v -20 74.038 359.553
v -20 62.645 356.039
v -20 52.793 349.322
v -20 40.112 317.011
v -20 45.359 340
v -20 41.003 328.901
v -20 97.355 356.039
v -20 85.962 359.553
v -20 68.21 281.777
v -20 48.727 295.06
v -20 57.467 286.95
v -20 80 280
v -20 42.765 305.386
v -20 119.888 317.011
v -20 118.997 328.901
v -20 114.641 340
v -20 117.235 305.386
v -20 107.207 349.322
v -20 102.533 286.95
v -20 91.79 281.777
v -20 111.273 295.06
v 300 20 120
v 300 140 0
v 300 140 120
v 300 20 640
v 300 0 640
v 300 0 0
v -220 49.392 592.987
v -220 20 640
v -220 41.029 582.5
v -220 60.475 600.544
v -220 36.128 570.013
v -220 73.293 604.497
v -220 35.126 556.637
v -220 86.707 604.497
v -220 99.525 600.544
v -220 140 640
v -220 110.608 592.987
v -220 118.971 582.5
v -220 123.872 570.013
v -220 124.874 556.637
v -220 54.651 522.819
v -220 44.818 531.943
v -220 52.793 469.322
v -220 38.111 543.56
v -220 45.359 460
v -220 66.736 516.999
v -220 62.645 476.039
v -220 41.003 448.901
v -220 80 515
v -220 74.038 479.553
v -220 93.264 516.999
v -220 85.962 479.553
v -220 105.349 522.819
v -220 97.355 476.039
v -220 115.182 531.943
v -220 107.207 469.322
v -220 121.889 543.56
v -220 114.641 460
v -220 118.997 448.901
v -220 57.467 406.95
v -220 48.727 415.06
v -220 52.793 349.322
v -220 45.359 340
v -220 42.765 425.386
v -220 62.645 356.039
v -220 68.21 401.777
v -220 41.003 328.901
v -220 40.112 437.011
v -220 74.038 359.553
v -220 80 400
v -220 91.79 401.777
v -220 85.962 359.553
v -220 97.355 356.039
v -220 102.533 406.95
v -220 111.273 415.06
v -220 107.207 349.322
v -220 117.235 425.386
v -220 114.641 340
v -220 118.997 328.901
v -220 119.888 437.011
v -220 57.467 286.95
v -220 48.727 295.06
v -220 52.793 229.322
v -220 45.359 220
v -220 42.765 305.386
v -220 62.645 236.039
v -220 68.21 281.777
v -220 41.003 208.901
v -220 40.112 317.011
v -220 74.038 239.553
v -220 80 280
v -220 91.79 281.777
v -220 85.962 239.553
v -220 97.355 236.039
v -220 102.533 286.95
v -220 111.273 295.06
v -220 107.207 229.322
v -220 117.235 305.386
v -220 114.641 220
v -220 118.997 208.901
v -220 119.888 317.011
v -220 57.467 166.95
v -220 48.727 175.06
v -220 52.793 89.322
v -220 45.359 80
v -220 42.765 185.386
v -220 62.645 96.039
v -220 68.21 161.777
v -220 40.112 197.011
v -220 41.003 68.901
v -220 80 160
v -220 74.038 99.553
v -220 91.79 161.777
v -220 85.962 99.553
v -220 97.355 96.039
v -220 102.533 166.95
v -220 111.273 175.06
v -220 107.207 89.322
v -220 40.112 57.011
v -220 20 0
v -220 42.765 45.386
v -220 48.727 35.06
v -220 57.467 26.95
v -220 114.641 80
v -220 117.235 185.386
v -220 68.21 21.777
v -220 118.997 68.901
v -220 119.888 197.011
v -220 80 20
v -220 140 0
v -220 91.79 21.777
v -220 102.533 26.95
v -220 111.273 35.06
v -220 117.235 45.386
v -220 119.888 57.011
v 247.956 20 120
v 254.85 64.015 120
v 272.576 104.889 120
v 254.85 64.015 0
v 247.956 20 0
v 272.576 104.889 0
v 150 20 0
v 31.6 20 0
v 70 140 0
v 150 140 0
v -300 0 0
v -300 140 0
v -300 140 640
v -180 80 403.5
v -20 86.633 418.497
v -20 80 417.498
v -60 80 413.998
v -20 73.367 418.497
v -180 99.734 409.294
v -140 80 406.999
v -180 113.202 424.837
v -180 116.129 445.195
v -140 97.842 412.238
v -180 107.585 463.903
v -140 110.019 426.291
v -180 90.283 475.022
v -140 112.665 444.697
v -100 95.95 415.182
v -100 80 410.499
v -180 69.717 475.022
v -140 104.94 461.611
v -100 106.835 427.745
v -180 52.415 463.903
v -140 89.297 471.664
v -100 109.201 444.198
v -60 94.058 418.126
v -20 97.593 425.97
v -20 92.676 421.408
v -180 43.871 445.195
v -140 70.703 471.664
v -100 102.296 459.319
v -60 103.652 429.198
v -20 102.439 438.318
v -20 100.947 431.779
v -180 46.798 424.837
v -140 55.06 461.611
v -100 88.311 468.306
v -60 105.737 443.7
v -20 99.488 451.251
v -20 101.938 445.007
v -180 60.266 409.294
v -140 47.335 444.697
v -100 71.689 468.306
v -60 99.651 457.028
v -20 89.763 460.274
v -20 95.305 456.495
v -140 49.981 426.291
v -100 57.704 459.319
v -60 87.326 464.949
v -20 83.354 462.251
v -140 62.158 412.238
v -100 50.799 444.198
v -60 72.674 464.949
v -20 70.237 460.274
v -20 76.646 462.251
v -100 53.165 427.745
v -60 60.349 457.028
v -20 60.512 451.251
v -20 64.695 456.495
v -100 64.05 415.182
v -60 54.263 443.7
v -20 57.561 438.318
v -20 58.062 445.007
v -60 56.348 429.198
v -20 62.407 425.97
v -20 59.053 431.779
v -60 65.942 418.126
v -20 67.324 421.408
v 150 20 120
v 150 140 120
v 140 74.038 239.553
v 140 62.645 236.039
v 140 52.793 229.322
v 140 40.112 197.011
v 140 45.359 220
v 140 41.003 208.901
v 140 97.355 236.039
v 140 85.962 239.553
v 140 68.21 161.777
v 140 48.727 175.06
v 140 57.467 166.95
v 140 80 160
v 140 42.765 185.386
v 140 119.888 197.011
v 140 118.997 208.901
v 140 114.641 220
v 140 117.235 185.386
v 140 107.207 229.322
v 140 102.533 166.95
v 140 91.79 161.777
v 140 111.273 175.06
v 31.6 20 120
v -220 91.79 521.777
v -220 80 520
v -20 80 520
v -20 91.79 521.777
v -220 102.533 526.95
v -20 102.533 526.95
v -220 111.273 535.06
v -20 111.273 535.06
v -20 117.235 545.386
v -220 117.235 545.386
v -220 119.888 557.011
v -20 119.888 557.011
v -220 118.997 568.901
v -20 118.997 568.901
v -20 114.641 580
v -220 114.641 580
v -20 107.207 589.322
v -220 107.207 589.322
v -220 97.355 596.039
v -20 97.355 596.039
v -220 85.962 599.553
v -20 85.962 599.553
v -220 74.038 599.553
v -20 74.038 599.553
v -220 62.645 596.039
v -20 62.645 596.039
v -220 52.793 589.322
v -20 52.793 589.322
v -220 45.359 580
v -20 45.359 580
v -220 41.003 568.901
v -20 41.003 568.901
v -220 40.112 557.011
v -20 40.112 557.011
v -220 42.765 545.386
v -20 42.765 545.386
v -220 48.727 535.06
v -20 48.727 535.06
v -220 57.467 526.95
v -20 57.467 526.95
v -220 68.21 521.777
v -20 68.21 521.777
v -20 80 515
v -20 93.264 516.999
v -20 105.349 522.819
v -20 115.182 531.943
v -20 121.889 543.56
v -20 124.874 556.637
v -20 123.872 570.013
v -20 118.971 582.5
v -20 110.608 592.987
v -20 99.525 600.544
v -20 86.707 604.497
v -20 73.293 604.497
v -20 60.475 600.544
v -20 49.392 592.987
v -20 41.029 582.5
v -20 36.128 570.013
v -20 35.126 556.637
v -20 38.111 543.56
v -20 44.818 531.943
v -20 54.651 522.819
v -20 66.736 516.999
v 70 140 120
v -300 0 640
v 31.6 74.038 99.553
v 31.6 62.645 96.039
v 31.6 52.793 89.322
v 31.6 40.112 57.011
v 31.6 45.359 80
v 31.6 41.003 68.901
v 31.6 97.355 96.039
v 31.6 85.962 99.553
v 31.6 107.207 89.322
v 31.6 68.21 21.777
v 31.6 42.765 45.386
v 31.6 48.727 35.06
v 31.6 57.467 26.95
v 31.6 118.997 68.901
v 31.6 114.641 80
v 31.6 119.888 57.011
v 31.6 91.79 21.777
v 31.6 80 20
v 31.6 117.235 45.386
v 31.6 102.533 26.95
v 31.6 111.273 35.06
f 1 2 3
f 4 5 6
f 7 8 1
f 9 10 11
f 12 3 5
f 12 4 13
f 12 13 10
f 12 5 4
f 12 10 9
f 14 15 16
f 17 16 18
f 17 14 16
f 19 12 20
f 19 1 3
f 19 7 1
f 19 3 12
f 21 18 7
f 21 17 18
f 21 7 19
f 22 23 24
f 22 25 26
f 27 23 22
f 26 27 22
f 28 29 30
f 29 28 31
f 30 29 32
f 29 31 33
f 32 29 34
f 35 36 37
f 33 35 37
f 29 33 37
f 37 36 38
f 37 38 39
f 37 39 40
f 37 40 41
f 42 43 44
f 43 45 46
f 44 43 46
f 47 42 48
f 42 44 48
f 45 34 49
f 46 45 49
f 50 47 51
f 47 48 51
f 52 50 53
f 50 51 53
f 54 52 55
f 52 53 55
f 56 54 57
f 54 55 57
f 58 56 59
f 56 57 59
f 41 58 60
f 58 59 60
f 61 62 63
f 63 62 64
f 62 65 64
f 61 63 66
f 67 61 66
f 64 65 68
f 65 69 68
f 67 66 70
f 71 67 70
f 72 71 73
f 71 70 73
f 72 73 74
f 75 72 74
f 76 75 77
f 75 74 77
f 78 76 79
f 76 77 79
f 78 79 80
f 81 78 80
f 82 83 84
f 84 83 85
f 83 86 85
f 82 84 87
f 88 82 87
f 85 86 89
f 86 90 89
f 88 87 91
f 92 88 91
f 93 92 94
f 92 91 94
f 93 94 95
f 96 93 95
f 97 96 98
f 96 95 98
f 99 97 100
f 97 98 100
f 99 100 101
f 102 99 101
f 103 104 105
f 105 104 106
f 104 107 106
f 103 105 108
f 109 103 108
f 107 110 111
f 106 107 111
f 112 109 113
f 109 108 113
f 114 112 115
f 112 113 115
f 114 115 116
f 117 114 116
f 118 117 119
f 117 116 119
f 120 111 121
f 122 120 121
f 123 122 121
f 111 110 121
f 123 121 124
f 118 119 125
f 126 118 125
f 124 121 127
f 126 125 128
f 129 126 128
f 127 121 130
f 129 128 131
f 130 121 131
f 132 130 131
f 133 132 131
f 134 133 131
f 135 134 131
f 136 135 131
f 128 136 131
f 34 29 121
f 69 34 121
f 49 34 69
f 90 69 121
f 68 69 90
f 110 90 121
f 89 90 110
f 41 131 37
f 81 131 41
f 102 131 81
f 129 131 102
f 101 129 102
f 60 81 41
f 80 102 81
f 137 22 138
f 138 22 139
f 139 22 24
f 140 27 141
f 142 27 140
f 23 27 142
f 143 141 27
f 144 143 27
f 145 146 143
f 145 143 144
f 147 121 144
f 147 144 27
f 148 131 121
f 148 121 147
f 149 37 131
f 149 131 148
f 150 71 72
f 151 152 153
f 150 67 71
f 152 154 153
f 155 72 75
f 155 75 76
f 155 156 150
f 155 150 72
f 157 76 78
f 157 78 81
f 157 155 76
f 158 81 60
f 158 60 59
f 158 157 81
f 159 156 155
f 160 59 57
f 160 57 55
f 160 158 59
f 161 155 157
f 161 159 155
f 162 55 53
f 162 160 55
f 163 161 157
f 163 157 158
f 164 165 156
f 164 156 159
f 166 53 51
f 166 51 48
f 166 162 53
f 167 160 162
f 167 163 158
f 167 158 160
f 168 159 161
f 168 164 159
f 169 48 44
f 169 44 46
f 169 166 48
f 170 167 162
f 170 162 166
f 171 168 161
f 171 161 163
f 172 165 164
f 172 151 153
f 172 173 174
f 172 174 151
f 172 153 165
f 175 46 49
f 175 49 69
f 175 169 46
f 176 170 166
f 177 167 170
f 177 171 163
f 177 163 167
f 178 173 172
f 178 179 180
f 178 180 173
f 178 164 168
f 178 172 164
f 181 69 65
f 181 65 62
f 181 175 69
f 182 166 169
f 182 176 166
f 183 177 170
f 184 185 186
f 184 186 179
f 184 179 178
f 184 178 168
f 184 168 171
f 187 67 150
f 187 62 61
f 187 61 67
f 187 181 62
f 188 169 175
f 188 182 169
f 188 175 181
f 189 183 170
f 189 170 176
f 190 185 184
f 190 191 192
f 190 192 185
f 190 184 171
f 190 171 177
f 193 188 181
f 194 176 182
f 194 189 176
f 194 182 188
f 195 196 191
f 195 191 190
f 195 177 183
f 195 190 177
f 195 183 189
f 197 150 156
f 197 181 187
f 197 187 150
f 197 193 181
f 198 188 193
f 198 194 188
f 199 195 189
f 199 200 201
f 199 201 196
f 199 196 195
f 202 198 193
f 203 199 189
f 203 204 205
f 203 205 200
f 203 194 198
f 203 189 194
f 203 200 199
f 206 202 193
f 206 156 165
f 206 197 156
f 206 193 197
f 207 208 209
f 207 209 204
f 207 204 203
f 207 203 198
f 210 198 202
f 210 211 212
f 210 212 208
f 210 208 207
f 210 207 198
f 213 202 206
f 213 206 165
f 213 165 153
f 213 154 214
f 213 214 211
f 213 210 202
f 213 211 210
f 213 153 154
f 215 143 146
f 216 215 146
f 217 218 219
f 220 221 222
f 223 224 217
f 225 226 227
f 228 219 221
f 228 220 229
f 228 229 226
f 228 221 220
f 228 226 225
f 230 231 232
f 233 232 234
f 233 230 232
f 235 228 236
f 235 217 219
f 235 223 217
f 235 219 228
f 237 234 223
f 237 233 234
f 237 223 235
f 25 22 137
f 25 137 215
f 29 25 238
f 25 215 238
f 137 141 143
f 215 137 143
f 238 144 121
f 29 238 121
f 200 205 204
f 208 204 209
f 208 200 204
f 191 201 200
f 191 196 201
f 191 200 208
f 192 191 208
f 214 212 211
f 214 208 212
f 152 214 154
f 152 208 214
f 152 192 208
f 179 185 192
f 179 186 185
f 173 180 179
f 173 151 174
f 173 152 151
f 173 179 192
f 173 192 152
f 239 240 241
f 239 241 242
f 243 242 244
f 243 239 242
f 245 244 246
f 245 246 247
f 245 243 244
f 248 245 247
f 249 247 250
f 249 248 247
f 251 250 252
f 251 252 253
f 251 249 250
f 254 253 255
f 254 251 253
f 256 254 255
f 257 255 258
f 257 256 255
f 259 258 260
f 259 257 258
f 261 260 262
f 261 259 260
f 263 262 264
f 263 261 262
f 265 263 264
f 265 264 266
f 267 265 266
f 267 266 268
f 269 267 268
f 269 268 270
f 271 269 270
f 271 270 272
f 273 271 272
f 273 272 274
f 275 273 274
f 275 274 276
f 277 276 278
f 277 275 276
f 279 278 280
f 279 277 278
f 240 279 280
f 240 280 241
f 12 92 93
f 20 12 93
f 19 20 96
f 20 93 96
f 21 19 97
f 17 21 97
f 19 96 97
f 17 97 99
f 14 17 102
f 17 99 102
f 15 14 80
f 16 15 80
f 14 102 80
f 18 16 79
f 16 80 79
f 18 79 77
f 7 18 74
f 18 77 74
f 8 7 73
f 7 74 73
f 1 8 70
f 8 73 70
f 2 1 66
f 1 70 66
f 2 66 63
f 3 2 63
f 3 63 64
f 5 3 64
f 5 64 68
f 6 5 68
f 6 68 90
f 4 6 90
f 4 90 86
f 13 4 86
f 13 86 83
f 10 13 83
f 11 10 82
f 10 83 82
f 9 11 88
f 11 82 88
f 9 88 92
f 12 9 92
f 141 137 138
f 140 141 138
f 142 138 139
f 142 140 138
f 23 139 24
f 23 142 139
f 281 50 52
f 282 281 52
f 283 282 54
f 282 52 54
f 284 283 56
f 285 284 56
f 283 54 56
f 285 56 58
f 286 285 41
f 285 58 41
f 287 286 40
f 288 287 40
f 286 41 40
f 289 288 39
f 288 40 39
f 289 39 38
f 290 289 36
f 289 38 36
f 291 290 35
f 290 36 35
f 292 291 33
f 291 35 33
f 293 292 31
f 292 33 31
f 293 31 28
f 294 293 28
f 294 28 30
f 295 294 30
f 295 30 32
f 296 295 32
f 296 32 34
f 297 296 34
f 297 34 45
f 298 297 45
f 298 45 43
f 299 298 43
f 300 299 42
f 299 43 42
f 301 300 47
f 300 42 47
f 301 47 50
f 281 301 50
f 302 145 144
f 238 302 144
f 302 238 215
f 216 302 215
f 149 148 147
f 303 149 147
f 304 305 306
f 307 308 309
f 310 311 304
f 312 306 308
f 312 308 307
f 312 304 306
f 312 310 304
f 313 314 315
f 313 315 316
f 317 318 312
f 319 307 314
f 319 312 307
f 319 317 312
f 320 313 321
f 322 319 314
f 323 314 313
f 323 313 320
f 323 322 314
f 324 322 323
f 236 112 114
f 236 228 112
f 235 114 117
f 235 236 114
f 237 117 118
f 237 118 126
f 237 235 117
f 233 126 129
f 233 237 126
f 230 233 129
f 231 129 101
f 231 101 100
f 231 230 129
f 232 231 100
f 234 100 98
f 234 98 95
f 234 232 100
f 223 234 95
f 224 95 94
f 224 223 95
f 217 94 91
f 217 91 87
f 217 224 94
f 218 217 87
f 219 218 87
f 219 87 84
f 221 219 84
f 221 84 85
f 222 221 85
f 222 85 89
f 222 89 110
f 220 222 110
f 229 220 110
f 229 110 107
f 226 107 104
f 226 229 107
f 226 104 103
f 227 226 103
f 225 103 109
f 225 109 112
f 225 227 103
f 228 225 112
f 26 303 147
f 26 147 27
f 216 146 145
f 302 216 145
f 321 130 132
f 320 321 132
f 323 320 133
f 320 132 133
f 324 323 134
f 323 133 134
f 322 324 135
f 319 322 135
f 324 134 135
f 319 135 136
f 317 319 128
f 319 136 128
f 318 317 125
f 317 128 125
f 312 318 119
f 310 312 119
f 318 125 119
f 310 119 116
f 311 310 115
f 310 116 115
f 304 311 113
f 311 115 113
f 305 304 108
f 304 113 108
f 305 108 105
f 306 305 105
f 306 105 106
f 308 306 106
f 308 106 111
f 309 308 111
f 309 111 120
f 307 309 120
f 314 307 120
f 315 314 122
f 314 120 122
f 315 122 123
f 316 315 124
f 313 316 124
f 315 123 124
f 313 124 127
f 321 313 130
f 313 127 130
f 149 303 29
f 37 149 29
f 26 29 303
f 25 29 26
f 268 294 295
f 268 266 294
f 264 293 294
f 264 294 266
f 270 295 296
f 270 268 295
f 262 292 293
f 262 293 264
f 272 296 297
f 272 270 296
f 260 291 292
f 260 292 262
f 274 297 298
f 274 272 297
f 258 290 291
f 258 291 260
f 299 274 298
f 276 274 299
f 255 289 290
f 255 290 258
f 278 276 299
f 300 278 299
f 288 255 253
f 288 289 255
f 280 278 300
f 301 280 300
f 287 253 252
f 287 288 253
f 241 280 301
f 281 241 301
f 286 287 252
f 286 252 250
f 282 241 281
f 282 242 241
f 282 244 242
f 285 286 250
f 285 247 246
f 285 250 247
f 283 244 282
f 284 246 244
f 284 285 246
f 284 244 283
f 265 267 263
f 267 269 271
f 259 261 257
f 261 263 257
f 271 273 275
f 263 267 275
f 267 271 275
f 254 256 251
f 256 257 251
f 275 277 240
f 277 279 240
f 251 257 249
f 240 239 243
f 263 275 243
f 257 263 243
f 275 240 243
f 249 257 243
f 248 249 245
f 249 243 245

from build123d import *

# Parameters (mm, degrees)
BOSS_EXTRUDE1_DEPTH             = 640
BOSS_EXTRUDE2_DEPTH             = 120
ONE_SIDE_R                      = 40
BOSS_EXTRUDE4_DEPTH             = 251.6
BOTH_SIDES_R                    = 40
BOSS_EXTRUDE5_DEPTH             = 200
BOSS_EXTRUDE5_DIRECTION_2_REACH = 242
SOLID_2_R                       = 40
BOSS_EXTRUDE6_DEPTH             = 200
DRAFT_2_R                       = 40
BOSS_EXTRUDE7_DEPTH             = 200
BOSS_EXTRUDE7_TAPER             = 5
THICKEN_2_R                     = 45
THICKEN_2_R_2                   = 40
EXTRUDE_THIN1_DEPTH             = 200


with BuildPart() as part:
    # Sketch1 → Boss-Extrude1 (new body)
    with BuildSketch(Plane.XY):
        Polygon((-300, 0), (300, 0), (300, 20), (-220, 20), (-220, 140), (-300, 140), align=None)
    extrude(amount=BOSS_EXTRUDE1_DEPTH)

    # Sketch2 → Boss-Extrude2 (add)
    with BuildSketch(Plane.XY):
        with BuildLine():
            Line((300, 140), (300, 20))
            Line((300, 20), (247.956312481, 20))
            ThreePointArc((247.956312481, 20), (262.414199332, 85.015257999), (300, 140))
        make_face()
        Polygon((150, 140), (70, 140), (31.6, 20), (150, 20), align=None)
    extrude(amount=BOSS_EXTRUDE2_DEPTH)

    # One_Side → Boss-Extrude4 (add)
    with BuildSketch(Plane(origin=(-220, 0, 0), x_dir=(0, 0, -1), z_dir=(1, 0, 0))):
        with Locations((-60, 80)):
            Circle(ONE_SIDE_R)
    extrude(amount=BOSS_EXTRUDE4_DEPTH)

    # Both_Sides → Boss-Extrude5 (add)
    with BuildSketch(Plane(origin=(-60, 0, 0), x_dir=(0, 0, -1), z_dir=(1, 0, 0))):
        with Locations((-200, 80)):
            Circle(BOTH_SIDES_R)
    extrude(amount=BOSS_EXTRUDE5_DEPTH)

    # Both_Sides → Boss-Extrude5 direction 2 (add, up to next)
    with BuildSketch(Plane(origin=(-60, 0, 0), x_dir=(0, 0, -1), z_dir=(1, 0, 0)), mode=Mode.PRIVATE) as boss_extrude5_direction_2_sk1:
        with Locations((-200, 80)):
            Circle(BOTH_SIDES_R)
    boss_extrude5_direction_2_tool1 = extrude(boss_extrude5_direction_2_sk1.sketch, amount=-BOSS_EXTRUDE5_DIRECTION_2_REACH, mode=Mode.PRIVATE) - part.part
    add(boss_extrude5_direction_2_tool1.solids().sort_by_distance((-60, 80, 200))[0])

    # Solid 2 → Boss-Extrude6 (add)
    with BuildSketch(Plane(origin=(-220, 0, 0), x_dir=(0, 0, -1), z_dir=(1, 0, 0))):
        with Locations((-320, 80)):
            Circle(SOLID_2_R)
    extrude(amount=BOSS_EXTRUDE6_DEPTH)

    # Draft 2 → Boss-Extrude7 (add)
    with BuildSketch(Plane(origin=(-220, 0, 0), x_dir=(0, 0, -1), z_dir=(1, 0, 0))):
        with Locations((-440, 80)):
            Circle(DRAFT_2_R)
    extrude(amount=BOSS_EXTRUDE7_DEPTH, taper=BOSS_EXTRUDE7_TAPER)

    # Thicken 2 → Extrude-Thin1 (add)
    with BuildSketch(Plane(origin=(-220, 0, 0), x_dir=(0, 0, -1), z_dir=(1, 0, 0))):
        with Locations((-560, 80)):
            Circle(THICKEN_2_R)
        with Locations((-560, 80)):
            Circle(THICKEN_2_R_2, mode=Mode.SUBTRACT)
    extrude(amount=EXTRUDE_THIN1_DEPTH)


solid = part.part
